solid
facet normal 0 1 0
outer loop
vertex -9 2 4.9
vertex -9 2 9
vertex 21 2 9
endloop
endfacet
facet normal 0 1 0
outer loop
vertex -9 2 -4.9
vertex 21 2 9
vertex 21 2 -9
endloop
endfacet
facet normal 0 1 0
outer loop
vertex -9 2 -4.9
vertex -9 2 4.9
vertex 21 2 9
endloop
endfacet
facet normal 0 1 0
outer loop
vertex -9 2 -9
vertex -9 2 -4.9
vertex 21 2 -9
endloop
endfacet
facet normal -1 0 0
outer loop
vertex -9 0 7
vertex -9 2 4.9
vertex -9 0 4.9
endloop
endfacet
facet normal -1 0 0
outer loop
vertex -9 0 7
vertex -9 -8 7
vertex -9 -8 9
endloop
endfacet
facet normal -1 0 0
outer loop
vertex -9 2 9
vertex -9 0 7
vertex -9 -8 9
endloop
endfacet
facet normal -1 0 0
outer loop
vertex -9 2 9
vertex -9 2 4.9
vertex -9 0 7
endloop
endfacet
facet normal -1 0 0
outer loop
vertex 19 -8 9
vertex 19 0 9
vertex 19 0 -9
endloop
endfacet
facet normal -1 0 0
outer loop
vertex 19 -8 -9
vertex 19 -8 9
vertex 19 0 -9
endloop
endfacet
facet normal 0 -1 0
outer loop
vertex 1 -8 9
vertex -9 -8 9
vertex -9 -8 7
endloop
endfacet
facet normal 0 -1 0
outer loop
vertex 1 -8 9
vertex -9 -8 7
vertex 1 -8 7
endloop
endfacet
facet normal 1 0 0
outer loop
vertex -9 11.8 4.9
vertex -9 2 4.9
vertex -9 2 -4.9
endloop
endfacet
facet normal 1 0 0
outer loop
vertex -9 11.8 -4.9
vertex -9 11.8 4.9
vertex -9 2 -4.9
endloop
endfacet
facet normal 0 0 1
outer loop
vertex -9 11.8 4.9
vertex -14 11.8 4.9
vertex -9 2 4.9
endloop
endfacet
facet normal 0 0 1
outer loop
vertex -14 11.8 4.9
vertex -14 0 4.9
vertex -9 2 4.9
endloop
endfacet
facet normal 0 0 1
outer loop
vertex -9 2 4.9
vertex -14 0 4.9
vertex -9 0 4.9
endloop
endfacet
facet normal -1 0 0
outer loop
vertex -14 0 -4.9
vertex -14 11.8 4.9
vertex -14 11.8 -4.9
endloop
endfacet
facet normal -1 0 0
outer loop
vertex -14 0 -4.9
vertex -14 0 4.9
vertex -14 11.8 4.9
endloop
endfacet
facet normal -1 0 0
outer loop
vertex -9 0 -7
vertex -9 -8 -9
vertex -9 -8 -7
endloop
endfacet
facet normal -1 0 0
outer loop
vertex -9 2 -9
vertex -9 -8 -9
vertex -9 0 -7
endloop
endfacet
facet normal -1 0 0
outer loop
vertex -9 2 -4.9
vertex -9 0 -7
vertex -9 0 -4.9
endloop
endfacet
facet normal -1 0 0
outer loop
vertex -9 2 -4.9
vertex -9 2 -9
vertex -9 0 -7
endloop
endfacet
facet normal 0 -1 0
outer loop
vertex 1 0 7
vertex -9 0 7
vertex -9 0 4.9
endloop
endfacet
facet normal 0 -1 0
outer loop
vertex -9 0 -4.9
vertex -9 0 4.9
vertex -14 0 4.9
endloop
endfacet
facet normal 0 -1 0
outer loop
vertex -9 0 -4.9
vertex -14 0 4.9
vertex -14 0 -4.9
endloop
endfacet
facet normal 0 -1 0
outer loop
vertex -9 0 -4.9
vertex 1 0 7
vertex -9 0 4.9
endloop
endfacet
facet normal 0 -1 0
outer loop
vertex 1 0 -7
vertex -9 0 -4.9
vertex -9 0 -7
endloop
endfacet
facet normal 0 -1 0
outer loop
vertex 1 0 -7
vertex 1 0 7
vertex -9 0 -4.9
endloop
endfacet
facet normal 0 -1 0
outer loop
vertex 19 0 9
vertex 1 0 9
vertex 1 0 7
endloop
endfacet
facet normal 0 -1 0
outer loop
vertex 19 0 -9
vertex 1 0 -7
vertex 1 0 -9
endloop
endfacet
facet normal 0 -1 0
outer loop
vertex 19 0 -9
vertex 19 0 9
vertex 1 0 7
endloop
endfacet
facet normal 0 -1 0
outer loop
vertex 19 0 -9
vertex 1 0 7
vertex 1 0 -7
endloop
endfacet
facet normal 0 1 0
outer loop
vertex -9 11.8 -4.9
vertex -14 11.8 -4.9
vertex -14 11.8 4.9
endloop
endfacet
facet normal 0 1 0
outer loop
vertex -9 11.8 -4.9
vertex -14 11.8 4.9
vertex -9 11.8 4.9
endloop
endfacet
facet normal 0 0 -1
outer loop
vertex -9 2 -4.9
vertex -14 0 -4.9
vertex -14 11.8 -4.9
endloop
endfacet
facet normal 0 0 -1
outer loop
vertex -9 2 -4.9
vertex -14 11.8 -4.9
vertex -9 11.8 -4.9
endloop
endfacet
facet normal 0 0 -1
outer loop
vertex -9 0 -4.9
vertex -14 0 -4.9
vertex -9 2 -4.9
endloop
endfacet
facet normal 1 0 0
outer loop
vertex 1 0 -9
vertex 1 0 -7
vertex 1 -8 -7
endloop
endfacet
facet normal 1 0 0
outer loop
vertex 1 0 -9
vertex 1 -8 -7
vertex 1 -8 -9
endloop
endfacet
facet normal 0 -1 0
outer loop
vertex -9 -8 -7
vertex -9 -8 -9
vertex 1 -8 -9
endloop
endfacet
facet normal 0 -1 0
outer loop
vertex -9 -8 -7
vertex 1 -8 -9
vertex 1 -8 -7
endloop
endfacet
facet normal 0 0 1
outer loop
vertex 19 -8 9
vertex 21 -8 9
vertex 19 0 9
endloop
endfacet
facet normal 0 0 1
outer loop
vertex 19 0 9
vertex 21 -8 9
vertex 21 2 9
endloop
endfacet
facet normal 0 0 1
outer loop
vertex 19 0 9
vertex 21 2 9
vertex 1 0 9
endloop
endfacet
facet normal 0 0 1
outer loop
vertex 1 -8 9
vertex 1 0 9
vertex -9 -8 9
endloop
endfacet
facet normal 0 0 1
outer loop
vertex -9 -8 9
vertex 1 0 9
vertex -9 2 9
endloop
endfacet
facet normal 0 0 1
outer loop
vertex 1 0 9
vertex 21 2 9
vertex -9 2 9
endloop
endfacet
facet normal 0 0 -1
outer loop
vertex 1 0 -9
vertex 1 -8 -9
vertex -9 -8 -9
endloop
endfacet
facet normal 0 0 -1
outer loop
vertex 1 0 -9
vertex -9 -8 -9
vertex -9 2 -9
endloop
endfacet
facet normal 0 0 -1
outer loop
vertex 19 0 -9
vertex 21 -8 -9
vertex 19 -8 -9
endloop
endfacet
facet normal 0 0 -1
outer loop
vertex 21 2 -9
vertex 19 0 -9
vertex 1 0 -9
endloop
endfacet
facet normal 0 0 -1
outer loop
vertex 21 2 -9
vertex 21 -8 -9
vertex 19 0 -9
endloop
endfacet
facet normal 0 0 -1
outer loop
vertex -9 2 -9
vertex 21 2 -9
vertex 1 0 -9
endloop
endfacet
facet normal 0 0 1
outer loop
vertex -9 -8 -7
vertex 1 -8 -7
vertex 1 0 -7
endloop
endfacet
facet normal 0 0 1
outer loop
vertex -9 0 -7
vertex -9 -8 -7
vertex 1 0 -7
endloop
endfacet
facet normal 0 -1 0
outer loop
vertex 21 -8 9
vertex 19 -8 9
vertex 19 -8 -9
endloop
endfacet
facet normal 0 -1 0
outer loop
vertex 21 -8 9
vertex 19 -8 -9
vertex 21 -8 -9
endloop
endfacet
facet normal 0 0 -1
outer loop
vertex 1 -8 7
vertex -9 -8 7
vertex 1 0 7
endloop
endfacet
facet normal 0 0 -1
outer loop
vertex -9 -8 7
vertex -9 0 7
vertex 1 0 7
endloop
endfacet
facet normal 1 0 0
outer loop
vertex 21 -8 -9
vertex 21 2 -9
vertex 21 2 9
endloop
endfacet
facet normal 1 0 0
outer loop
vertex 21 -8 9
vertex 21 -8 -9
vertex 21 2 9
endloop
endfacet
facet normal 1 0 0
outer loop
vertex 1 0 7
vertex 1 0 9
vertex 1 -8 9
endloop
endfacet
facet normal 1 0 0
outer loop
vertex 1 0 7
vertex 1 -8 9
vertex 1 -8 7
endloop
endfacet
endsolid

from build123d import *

# Parameters (mm, degrees)
SKETCH2_W            = 18
SKETCH2_H            = 18
BOSS_EXTRUDE1_DEPTH  = 2
SKETCH3_W            = 18
SKETCH3_H            = 2
BOSS_EXTRUDE2_DEPTH  = 8
SKETCH4_W            = 18
SKETCH4_H            = 2
BOSS_EXTRUDE3_DEPTH  = 12
BOSS_EXTRUDE4_DEPTH  = 8
SKETCH6_W            = 9.8
SKETCH6_H            = 2
BOSS_EXTRUDE5_DEPTH  = 5
SKETCH6_2_W          = 9.8
SKETCH6_2_H          = 2
BOSS_EXTRUDE7_DEPTH  = 5
SKETCH9_W            = 5
SKETCH9_H            = 9.8
BOSS_EXTRUDE8_DEPTH  = 9.8
SKETCH10_W           = 10
SKETCH10_H           = 8
CUT_EXTRUDE2_DEPTH   = 11.8
SKETCH11_W           = 2
SKETCH11_H           = 8
CUT_EXTRUDE4_DEPTH   = 8
SKETCH16_W           = 8
SKETCH16_H           = 8
CUT_EXTRUDE5_DEPTH   = 8
SKETCH17_W           = 2
SKETCH17_H           = 8
BOSS_EXTRUDE11_DEPTH = 8
SKETCH18_W           = 2
SKETCH18_H           = 8
CUT_EXTRUDE6_DEPTH   = 8


with BuildPart() as part:
    # Sketch2 → Boss-Extrude1 (new body)
    with BuildSketch(Plane(origin=(0, 0, 0), x_dir=(1, 0, 0), z_dir=(0, 1, 0))):
        Rectangle(SKETCH2_W, SKETCH2_H)
    extrude(amount=BOSS_EXTRUDE1_DEPTH)

    # Sketch3 → Boss-Extrude2 (add)
    with BuildSketch(Plane.XZ):
        with Locations((0, 8)):
            Rectangle(SKETCH3_W, SKETCH3_H)
        with Locations((0, -8)):
            Rectangle(SKETCH3_W, SKETCH3_H)
    extrude(amount=BOSS_EXTRUDE2_DEPTH)

    # Sketch4 → Boss-Extrude3 (add)
    with BuildSketch(Plane(origin=(9, 0, 0), x_dir=(0, 0, -1), z_dir=(1, 0, 0))):
        with Locations((0, 1)):
            Rectangle(SKETCH4_W, SKETCH4_H)
    extrude(amount=BOSS_EXTRUDE3_DEPTH)

    # Sketch5 → Boss-Extrude4 (add)
    with BuildSketch(Plane.XZ):
        Polygon((21, 9), (19, 9), (9, 9), (9, 7), (19, 7), (19, -9), (21, -9), align=None)
    extrude(amount=BOSS_EXTRUDE4_DEPTH)

    # Sketch6 → Boss-Extrude5 (add)
    with BuildSketch(Plane.ZY.offset(9)):
        with Locations((0, 1)):
            Rectangle(SKETCH6_W, SKETCH6_H)
    extrude(amount=BOSS_EXTRUDE5_DEPTH)

    # Sketch6<2> → Boss-Extrude7 (add)
    with BuildSketch(Plane.ZY.offset(9)):
        with Locations((0, 1)):
            Rectangle(SKETCH6_2_W, SKETCH6_2_H)
    extrude(amount=BOSS_EXTRUDE7_DEPTH)

    # Sketch9 → Boss-Extrude8 (add)
    with BuildSketch(Plane(origin=(0, 2, 0), x_dir=(1, 0, 0), z_dir=(0, 1, 0))):
        with Locations((-11.5, 0)):
            Rectangle(SKETCH9_W, SKETCH9_H)
    extrude(amount=BOSS_EXTRUDE8_DEPTH)

    # Sketch10 → Cut-Extrude2 (cut)
    with BuildSketch(Plane(origin=(0, 0, 7), x_dir=(-1, 0, 0), z_dir=(0, 0, -1))):
        with Locations((-14, -4)):
            Rectangle(SKETCH10_W, SKETCH10_H)
    extrude(amount=-CUT_EXTRUDE2_DEPTH, mode=Mode.SUBTRACT)

    # Sketch11 → Cut-Extrude4 (cut)
    with BuildSketch(Plane.ZY.offset(9)):
        with Locations((-8, -4)):
            Rectangle(SKETCH11_W, SKETCH11_H)
    extrude(amount=-CUT_EXTRUDE4_DEPTH, mode=Mode.SUBTRACT)

    # Sketch16 → Cut-Extrude5 (cut)
    with BuildSketch(Plane(origin=(0, 0, 7), x_dir=(-1, 0, 0), z_dir=(0, 0, -1))):
        with Locations((5, -4)):
            Rectangle(SKETCH16_W, SKETCH16_H)
    extrude(amount=-CUT_EXTRUDE5_DEPTH, mode=Mode.SUBTRACT)

    # Sketch17 → Boss-Extrude11 (add)
    with BuildSketch(Plane.ZY.offset(1)):
        with Locations((-8, -4)):
            Rectangle(SKETCH17_W, SKETCH17_H)
        with Locations((8, -4)):
            Rectangle(SKETCH17_W, SKETCH17_H)
    extrude(amount=BOSS_EXTRUDE11_DEPTH)

    # Sketch18 → Cut-Extrude6 (cut)
    with BuildSketch(Plane(origin=(9, 0, 0), x_dir=(0, 0, -1), z_dir=(1, 0, 0))):
        with Locations((8, -4)):
            Rectangle(SKETCH18_W, SKETCH18_H)
        with Locations((-8, -4)):
            Rectangle(SKETCH18_W, SKETCH18_H)
    extrude(amount=-CUT_EXTRUDE6_DEPTH, mode=Mode.SUBTRACT)


solid = part.part
